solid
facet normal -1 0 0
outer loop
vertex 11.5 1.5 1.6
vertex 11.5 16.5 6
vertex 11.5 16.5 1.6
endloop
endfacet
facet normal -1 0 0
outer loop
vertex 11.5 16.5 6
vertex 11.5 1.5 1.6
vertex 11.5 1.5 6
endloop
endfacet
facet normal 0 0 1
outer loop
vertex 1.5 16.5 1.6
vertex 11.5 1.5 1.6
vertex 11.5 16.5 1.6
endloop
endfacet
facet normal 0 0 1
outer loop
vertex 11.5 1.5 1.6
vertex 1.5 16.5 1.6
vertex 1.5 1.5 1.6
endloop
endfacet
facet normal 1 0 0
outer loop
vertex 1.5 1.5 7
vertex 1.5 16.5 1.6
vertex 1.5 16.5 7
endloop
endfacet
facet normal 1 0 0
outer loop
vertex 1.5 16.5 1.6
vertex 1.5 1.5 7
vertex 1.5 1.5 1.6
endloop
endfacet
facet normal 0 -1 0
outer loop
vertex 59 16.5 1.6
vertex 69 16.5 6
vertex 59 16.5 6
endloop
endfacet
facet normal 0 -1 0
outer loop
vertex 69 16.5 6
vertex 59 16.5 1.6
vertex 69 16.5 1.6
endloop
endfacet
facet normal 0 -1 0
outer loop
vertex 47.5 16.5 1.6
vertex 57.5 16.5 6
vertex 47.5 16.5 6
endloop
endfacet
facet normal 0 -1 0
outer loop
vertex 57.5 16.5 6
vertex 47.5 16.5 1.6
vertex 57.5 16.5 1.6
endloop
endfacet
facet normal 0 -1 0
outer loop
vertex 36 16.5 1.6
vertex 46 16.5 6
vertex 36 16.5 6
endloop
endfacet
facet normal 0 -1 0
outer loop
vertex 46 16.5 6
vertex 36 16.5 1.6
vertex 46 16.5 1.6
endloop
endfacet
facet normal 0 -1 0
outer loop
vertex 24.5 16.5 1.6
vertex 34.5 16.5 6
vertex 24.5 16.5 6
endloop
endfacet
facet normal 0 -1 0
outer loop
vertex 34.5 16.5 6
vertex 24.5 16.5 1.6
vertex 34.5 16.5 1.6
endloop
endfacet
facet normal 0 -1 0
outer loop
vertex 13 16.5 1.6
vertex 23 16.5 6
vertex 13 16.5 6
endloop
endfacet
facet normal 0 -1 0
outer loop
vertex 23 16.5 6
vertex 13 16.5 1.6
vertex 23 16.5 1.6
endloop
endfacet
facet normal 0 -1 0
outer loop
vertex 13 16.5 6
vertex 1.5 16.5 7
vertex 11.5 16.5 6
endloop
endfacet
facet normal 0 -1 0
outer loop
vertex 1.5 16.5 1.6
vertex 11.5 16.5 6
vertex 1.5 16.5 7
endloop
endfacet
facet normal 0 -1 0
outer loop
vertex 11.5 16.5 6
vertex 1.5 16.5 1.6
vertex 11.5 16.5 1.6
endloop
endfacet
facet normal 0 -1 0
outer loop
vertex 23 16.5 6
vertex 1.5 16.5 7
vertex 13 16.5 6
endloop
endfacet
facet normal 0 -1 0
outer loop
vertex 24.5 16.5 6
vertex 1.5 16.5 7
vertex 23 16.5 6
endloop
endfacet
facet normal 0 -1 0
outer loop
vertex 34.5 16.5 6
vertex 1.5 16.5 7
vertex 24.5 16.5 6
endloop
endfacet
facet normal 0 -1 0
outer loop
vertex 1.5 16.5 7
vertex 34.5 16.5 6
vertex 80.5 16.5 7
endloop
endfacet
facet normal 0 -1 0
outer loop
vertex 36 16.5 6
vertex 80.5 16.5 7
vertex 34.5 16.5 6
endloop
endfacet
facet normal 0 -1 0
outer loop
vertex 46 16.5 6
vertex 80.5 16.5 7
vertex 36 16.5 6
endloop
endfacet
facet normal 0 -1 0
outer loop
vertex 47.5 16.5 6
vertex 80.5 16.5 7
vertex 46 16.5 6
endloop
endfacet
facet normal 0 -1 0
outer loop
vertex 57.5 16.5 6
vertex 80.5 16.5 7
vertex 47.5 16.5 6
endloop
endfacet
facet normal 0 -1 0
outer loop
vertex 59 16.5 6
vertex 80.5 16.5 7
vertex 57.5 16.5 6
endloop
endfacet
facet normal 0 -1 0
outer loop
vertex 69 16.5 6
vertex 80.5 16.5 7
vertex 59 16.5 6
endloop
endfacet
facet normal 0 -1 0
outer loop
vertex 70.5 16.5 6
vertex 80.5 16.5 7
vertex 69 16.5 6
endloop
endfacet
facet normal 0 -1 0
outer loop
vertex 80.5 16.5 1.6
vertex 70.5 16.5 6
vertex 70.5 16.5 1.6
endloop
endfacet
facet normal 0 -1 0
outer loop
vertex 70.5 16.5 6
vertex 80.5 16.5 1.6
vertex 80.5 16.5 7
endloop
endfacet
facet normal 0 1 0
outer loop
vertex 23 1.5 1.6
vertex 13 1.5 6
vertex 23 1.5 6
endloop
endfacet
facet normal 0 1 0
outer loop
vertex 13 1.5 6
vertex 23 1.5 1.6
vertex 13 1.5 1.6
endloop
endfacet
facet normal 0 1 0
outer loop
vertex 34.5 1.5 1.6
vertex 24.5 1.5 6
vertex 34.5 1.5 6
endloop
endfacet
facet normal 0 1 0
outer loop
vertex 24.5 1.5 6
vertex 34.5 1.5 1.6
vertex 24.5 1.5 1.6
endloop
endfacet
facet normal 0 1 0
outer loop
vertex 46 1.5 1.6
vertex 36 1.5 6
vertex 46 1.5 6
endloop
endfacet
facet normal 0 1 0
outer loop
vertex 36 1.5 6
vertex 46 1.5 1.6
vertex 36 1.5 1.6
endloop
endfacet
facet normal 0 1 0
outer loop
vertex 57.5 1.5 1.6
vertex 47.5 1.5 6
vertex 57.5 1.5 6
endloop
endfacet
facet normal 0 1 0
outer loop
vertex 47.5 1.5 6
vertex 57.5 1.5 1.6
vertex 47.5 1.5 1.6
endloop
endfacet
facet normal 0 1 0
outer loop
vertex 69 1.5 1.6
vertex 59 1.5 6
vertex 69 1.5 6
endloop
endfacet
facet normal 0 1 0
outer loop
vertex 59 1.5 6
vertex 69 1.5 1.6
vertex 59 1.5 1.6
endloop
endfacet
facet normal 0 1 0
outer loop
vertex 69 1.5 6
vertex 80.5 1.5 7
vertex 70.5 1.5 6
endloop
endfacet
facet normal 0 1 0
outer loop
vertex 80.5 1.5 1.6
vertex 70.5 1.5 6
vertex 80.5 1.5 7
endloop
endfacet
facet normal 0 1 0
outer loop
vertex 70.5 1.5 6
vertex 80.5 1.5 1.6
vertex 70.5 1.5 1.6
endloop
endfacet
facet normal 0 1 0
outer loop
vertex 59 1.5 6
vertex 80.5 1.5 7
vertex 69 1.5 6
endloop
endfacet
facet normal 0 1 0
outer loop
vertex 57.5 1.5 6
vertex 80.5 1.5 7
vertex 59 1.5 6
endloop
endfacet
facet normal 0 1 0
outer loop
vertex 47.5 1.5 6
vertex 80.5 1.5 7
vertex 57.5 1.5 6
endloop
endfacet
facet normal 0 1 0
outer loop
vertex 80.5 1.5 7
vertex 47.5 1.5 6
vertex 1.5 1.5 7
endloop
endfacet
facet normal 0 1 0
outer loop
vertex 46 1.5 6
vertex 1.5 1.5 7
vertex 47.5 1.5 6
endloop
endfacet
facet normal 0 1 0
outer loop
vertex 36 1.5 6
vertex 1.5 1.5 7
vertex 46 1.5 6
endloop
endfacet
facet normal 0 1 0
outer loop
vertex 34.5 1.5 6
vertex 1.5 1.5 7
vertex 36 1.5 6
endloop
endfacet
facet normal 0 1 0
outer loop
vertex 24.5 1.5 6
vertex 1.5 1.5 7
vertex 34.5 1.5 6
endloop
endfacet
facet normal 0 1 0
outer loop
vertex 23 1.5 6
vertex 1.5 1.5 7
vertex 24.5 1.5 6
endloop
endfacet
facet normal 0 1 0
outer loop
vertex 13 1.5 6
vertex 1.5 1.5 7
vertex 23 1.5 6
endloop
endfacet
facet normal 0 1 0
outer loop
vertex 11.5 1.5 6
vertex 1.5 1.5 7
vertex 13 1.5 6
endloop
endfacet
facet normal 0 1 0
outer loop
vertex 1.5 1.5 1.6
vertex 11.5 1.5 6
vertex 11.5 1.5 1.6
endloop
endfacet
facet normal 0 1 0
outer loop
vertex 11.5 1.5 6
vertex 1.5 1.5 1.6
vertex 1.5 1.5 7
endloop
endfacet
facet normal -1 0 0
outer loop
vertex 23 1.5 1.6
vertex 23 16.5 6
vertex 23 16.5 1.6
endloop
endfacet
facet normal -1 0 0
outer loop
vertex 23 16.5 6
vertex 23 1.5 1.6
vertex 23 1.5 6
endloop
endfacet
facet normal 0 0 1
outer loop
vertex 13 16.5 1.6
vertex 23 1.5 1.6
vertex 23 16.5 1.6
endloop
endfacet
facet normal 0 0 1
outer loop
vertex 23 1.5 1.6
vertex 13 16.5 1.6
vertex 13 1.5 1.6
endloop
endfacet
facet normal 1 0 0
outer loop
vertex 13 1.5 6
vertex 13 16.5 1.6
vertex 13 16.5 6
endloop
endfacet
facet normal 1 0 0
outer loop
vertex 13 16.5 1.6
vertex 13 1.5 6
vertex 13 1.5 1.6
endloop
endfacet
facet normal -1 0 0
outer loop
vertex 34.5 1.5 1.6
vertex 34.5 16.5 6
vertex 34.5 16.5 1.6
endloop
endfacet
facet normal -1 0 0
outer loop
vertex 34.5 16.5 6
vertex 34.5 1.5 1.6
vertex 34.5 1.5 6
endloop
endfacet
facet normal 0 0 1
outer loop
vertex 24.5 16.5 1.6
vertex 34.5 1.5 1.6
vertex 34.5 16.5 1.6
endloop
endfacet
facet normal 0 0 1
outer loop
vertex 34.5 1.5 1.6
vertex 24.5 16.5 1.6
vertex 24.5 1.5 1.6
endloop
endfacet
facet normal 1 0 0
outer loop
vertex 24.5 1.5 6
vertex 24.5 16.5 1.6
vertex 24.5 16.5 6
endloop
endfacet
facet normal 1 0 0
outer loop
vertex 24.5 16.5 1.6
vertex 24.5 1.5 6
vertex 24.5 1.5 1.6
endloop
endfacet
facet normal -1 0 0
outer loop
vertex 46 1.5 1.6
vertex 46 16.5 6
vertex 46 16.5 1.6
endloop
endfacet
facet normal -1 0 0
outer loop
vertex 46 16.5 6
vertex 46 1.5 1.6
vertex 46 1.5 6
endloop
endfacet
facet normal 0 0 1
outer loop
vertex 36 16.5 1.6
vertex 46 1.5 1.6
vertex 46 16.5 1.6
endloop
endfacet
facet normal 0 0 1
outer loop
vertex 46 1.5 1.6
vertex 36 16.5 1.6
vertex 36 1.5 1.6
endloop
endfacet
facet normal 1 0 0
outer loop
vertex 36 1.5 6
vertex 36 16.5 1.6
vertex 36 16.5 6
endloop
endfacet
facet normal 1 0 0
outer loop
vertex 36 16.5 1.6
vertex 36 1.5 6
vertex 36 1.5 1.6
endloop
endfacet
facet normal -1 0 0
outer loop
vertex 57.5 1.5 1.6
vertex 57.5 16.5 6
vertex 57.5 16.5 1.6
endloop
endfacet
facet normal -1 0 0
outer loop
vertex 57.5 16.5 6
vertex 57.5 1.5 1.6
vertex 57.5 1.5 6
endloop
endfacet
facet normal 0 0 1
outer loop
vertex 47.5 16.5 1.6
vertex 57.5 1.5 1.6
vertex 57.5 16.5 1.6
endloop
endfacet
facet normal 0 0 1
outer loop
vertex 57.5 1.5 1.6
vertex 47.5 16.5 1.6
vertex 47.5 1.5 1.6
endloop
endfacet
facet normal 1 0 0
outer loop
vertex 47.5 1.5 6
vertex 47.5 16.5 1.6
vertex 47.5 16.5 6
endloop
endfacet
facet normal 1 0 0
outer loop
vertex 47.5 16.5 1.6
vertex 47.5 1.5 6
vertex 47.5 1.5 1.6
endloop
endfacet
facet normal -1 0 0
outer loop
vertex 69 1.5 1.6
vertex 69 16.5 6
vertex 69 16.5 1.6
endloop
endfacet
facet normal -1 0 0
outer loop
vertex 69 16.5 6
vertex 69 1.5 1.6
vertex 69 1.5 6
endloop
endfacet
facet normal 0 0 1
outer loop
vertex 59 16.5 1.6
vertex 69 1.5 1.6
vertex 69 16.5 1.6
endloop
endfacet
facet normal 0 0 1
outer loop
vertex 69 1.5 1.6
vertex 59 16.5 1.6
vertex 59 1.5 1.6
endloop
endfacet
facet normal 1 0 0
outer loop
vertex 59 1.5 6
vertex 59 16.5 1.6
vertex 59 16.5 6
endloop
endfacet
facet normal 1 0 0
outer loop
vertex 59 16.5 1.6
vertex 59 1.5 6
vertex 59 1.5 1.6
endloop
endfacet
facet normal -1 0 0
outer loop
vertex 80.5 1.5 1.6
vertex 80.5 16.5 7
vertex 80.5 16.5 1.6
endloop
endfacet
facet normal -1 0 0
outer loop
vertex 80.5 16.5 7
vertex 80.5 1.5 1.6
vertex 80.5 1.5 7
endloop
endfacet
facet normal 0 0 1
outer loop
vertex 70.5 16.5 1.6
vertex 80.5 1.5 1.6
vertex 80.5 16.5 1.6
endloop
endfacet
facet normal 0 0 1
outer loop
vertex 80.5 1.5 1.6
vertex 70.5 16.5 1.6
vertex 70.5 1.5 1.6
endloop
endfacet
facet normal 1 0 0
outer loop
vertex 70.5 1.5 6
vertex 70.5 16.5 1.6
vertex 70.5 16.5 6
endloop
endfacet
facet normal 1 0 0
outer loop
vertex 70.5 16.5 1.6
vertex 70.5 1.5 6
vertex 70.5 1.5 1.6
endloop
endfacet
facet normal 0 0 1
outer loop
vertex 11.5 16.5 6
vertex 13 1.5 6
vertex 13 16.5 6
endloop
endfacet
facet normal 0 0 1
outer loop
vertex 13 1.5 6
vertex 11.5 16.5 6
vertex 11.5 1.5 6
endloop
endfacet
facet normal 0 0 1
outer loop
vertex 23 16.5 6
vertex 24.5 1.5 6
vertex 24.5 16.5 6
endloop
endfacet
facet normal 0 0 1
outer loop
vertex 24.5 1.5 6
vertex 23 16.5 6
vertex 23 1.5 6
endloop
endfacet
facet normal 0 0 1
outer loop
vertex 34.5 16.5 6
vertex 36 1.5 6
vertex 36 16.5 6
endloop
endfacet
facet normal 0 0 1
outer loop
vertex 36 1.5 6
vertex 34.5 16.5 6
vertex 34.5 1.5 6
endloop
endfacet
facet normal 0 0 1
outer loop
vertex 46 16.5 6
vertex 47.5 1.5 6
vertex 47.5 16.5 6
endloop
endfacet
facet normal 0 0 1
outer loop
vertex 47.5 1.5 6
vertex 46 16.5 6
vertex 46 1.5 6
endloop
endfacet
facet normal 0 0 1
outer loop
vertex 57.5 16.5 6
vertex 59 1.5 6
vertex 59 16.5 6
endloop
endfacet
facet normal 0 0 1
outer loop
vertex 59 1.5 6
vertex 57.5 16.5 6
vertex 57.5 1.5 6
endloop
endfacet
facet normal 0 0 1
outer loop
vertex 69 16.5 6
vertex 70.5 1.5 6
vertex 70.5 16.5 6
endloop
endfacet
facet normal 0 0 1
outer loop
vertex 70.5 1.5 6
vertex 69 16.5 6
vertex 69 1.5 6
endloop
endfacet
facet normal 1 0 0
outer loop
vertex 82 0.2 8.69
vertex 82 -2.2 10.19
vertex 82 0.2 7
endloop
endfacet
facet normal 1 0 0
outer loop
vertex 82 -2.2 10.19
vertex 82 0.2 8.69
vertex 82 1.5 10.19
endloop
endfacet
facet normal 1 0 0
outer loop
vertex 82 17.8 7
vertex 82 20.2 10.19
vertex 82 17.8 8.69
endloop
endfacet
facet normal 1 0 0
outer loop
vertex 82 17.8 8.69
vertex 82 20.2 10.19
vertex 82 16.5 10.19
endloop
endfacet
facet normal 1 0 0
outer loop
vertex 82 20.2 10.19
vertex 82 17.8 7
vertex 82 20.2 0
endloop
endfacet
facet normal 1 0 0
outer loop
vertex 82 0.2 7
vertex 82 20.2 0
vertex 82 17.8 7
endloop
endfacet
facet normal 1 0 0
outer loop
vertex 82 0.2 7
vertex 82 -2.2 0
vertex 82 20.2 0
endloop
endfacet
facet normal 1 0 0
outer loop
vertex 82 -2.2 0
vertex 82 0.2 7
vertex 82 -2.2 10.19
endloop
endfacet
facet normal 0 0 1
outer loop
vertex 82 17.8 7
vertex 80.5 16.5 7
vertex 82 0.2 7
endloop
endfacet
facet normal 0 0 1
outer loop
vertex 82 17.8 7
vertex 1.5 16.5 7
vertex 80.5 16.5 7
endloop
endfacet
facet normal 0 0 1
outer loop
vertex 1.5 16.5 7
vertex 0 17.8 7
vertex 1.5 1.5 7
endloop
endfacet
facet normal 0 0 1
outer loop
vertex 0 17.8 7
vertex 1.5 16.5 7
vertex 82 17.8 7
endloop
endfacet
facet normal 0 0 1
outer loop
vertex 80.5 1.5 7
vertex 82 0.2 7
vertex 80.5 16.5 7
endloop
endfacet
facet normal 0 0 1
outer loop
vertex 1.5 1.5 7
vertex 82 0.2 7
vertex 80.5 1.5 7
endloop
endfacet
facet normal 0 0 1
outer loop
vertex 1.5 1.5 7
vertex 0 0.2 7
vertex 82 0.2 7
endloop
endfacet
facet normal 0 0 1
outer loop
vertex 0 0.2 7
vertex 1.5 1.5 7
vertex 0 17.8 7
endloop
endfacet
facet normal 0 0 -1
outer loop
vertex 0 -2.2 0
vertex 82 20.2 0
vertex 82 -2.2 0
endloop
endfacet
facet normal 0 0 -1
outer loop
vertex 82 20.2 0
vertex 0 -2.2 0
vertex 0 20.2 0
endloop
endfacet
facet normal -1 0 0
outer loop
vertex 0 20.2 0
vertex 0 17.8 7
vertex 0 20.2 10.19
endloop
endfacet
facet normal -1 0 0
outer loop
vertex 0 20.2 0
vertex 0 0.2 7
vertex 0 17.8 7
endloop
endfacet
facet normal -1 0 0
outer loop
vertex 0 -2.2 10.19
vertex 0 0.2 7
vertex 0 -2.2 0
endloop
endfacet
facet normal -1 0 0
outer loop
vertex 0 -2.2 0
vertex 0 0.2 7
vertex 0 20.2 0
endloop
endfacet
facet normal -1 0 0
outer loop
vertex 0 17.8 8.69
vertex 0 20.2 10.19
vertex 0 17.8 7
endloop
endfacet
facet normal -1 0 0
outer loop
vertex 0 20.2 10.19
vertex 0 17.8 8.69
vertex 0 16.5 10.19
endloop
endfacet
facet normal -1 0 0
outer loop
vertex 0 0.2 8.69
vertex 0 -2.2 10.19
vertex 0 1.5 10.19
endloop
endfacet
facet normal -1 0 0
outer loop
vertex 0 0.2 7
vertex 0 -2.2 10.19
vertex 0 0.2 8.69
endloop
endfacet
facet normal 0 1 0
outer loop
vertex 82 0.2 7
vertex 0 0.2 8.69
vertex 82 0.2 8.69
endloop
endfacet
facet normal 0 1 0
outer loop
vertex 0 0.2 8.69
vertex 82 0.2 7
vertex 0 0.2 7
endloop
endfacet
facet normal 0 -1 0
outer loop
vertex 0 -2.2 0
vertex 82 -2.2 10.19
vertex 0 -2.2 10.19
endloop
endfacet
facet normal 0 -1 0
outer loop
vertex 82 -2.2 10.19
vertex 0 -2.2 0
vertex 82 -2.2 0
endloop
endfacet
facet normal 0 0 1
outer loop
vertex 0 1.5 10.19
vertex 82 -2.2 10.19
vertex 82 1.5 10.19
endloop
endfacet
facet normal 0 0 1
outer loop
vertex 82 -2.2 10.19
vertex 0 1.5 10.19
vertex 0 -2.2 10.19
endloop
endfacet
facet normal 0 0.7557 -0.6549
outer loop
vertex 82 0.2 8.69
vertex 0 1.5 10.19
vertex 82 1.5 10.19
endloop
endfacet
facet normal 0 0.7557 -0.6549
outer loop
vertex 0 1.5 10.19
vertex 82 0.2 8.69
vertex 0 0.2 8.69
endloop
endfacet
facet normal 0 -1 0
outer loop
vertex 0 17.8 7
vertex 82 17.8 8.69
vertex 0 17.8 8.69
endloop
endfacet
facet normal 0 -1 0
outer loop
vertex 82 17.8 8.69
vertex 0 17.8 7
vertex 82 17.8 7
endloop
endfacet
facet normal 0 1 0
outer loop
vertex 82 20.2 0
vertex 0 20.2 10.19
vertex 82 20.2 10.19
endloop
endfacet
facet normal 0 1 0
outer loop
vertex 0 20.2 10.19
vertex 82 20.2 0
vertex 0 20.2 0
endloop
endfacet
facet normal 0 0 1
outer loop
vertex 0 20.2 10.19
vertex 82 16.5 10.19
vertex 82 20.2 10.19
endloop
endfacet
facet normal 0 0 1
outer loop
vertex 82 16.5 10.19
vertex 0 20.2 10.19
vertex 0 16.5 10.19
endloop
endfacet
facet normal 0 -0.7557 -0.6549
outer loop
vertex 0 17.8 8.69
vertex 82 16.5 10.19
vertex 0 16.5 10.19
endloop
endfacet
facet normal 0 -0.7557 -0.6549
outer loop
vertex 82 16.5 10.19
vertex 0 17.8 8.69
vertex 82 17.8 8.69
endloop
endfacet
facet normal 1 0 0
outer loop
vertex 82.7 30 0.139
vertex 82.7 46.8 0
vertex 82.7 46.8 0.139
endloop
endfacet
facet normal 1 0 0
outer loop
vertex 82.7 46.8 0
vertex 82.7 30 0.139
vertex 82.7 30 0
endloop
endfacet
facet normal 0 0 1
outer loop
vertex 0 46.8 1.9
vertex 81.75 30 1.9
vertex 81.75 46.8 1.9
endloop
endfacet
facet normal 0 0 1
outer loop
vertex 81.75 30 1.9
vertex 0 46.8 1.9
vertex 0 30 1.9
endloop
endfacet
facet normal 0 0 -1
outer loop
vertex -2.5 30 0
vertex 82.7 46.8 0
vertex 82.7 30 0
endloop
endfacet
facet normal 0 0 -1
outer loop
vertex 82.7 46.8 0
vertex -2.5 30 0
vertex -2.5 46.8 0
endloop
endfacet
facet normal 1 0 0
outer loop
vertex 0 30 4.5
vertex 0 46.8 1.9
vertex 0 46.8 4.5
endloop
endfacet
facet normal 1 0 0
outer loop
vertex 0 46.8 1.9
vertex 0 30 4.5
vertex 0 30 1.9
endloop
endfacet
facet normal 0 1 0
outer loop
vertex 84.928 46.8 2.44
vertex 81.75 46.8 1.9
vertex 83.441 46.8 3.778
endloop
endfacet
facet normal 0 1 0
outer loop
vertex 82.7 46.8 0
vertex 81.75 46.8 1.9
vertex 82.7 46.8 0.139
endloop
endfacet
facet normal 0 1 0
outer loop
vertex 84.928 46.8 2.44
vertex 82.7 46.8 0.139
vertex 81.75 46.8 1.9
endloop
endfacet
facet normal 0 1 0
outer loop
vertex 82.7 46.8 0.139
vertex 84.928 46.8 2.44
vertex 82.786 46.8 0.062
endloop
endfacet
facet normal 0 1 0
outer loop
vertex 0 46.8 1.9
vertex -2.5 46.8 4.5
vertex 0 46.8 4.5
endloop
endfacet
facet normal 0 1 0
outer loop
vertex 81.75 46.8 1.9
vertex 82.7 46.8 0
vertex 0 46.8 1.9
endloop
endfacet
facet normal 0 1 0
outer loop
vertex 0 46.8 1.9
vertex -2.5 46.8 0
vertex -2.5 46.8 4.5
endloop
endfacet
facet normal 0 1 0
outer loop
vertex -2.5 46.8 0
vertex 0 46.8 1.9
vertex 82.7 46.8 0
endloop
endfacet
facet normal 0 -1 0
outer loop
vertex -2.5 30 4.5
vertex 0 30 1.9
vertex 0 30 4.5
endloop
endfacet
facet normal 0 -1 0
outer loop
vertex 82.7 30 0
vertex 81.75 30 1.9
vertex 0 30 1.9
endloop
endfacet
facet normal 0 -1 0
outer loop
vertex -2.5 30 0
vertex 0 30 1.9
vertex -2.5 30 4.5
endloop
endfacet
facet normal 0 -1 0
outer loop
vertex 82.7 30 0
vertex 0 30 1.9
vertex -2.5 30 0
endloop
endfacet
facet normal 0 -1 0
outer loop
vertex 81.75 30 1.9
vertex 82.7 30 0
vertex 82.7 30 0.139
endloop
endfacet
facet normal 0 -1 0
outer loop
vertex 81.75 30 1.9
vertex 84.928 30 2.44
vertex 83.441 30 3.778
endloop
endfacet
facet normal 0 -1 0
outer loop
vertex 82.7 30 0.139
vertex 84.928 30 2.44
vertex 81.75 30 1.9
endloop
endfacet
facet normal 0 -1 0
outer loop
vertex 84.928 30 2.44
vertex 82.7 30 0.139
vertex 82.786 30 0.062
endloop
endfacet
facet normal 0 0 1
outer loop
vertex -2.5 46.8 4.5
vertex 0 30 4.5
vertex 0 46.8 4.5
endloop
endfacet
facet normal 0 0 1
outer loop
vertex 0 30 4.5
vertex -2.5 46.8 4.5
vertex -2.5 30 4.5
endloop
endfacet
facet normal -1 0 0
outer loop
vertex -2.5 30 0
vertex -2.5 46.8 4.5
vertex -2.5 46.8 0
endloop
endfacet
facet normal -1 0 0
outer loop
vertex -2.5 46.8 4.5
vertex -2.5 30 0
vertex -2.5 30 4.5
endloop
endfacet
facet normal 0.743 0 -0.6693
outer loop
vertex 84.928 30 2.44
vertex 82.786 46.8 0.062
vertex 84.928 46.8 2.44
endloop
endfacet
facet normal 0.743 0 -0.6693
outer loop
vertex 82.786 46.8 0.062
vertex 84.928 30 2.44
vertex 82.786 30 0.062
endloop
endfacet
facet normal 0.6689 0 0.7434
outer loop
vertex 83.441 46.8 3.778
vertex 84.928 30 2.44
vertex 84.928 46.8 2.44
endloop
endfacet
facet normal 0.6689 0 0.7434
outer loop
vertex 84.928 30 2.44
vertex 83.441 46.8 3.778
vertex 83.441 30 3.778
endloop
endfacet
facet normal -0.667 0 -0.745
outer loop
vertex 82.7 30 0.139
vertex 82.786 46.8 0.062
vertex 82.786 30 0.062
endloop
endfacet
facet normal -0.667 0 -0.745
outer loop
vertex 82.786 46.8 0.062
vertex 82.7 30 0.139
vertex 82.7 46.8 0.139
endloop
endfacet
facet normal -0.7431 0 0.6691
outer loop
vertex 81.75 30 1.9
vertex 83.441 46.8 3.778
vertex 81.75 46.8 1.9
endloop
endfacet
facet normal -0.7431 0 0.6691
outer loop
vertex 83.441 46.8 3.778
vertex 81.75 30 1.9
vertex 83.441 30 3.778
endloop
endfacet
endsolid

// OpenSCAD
//widths for the pill compartments
wp = 10;
//depth for the pill compartments
dp = 15;

//wall size
ws = 1.5;
//side wall size
sws = 3.7;
//ridge width
rw = 1.3;
//ridge height
rh = 1.7;
//ridge thing height
rth = 1.5;
//pill box height
he = 7;
//wall height (center ones)
wh = he-1;

//tolerance
tol = .4;


difference()
{

cube([wp*7+ws*8, dp+ws*2, he]);

union()
{
translate([ws,ws,0])
for (n = [0:6])
{
translate([n*wp+n*ws,0,ws+.1])
cube([wp,dp,10]);
}
translate([ws,ws,wh])
cube([wp*7+ws*6,dp,he-wh+.1]);

}
}


//lid thingy
module lidthingy()
{
translate([0,-sws+ws,0])
cube([ws*8+wp*7,sws-rw,he+rh]);


//ridge thingy
translate([0,-sws+ws,he+rh+rth-.01])
rotate([0,90,0])
//cylinder(r=sws/2, h=10, $fn=6);
linear_extrude(height=wp*7+ws*8)
polygon(points=[[0,0],[rth,0],[rth,sws-rw], [0,sws]]);

}


lidthingy();

mirror([0,1,0])
translate([0,-dp-ws*2,0])
lidthingy();


//lid
translate([0,30,0])
{

cube([wp*7+ws*8+.7,dp+rw*2-tol*2,1.9]);
translate([-2.5,0,0])
cube([2.5,dp+rw*2-tol*2,4.5]);

translate([wp*7+ws*8-.7,0,.7*2])
rotate([0,42,0])
cube([2,dp+rw*2-tol*2,3.2]);

}
